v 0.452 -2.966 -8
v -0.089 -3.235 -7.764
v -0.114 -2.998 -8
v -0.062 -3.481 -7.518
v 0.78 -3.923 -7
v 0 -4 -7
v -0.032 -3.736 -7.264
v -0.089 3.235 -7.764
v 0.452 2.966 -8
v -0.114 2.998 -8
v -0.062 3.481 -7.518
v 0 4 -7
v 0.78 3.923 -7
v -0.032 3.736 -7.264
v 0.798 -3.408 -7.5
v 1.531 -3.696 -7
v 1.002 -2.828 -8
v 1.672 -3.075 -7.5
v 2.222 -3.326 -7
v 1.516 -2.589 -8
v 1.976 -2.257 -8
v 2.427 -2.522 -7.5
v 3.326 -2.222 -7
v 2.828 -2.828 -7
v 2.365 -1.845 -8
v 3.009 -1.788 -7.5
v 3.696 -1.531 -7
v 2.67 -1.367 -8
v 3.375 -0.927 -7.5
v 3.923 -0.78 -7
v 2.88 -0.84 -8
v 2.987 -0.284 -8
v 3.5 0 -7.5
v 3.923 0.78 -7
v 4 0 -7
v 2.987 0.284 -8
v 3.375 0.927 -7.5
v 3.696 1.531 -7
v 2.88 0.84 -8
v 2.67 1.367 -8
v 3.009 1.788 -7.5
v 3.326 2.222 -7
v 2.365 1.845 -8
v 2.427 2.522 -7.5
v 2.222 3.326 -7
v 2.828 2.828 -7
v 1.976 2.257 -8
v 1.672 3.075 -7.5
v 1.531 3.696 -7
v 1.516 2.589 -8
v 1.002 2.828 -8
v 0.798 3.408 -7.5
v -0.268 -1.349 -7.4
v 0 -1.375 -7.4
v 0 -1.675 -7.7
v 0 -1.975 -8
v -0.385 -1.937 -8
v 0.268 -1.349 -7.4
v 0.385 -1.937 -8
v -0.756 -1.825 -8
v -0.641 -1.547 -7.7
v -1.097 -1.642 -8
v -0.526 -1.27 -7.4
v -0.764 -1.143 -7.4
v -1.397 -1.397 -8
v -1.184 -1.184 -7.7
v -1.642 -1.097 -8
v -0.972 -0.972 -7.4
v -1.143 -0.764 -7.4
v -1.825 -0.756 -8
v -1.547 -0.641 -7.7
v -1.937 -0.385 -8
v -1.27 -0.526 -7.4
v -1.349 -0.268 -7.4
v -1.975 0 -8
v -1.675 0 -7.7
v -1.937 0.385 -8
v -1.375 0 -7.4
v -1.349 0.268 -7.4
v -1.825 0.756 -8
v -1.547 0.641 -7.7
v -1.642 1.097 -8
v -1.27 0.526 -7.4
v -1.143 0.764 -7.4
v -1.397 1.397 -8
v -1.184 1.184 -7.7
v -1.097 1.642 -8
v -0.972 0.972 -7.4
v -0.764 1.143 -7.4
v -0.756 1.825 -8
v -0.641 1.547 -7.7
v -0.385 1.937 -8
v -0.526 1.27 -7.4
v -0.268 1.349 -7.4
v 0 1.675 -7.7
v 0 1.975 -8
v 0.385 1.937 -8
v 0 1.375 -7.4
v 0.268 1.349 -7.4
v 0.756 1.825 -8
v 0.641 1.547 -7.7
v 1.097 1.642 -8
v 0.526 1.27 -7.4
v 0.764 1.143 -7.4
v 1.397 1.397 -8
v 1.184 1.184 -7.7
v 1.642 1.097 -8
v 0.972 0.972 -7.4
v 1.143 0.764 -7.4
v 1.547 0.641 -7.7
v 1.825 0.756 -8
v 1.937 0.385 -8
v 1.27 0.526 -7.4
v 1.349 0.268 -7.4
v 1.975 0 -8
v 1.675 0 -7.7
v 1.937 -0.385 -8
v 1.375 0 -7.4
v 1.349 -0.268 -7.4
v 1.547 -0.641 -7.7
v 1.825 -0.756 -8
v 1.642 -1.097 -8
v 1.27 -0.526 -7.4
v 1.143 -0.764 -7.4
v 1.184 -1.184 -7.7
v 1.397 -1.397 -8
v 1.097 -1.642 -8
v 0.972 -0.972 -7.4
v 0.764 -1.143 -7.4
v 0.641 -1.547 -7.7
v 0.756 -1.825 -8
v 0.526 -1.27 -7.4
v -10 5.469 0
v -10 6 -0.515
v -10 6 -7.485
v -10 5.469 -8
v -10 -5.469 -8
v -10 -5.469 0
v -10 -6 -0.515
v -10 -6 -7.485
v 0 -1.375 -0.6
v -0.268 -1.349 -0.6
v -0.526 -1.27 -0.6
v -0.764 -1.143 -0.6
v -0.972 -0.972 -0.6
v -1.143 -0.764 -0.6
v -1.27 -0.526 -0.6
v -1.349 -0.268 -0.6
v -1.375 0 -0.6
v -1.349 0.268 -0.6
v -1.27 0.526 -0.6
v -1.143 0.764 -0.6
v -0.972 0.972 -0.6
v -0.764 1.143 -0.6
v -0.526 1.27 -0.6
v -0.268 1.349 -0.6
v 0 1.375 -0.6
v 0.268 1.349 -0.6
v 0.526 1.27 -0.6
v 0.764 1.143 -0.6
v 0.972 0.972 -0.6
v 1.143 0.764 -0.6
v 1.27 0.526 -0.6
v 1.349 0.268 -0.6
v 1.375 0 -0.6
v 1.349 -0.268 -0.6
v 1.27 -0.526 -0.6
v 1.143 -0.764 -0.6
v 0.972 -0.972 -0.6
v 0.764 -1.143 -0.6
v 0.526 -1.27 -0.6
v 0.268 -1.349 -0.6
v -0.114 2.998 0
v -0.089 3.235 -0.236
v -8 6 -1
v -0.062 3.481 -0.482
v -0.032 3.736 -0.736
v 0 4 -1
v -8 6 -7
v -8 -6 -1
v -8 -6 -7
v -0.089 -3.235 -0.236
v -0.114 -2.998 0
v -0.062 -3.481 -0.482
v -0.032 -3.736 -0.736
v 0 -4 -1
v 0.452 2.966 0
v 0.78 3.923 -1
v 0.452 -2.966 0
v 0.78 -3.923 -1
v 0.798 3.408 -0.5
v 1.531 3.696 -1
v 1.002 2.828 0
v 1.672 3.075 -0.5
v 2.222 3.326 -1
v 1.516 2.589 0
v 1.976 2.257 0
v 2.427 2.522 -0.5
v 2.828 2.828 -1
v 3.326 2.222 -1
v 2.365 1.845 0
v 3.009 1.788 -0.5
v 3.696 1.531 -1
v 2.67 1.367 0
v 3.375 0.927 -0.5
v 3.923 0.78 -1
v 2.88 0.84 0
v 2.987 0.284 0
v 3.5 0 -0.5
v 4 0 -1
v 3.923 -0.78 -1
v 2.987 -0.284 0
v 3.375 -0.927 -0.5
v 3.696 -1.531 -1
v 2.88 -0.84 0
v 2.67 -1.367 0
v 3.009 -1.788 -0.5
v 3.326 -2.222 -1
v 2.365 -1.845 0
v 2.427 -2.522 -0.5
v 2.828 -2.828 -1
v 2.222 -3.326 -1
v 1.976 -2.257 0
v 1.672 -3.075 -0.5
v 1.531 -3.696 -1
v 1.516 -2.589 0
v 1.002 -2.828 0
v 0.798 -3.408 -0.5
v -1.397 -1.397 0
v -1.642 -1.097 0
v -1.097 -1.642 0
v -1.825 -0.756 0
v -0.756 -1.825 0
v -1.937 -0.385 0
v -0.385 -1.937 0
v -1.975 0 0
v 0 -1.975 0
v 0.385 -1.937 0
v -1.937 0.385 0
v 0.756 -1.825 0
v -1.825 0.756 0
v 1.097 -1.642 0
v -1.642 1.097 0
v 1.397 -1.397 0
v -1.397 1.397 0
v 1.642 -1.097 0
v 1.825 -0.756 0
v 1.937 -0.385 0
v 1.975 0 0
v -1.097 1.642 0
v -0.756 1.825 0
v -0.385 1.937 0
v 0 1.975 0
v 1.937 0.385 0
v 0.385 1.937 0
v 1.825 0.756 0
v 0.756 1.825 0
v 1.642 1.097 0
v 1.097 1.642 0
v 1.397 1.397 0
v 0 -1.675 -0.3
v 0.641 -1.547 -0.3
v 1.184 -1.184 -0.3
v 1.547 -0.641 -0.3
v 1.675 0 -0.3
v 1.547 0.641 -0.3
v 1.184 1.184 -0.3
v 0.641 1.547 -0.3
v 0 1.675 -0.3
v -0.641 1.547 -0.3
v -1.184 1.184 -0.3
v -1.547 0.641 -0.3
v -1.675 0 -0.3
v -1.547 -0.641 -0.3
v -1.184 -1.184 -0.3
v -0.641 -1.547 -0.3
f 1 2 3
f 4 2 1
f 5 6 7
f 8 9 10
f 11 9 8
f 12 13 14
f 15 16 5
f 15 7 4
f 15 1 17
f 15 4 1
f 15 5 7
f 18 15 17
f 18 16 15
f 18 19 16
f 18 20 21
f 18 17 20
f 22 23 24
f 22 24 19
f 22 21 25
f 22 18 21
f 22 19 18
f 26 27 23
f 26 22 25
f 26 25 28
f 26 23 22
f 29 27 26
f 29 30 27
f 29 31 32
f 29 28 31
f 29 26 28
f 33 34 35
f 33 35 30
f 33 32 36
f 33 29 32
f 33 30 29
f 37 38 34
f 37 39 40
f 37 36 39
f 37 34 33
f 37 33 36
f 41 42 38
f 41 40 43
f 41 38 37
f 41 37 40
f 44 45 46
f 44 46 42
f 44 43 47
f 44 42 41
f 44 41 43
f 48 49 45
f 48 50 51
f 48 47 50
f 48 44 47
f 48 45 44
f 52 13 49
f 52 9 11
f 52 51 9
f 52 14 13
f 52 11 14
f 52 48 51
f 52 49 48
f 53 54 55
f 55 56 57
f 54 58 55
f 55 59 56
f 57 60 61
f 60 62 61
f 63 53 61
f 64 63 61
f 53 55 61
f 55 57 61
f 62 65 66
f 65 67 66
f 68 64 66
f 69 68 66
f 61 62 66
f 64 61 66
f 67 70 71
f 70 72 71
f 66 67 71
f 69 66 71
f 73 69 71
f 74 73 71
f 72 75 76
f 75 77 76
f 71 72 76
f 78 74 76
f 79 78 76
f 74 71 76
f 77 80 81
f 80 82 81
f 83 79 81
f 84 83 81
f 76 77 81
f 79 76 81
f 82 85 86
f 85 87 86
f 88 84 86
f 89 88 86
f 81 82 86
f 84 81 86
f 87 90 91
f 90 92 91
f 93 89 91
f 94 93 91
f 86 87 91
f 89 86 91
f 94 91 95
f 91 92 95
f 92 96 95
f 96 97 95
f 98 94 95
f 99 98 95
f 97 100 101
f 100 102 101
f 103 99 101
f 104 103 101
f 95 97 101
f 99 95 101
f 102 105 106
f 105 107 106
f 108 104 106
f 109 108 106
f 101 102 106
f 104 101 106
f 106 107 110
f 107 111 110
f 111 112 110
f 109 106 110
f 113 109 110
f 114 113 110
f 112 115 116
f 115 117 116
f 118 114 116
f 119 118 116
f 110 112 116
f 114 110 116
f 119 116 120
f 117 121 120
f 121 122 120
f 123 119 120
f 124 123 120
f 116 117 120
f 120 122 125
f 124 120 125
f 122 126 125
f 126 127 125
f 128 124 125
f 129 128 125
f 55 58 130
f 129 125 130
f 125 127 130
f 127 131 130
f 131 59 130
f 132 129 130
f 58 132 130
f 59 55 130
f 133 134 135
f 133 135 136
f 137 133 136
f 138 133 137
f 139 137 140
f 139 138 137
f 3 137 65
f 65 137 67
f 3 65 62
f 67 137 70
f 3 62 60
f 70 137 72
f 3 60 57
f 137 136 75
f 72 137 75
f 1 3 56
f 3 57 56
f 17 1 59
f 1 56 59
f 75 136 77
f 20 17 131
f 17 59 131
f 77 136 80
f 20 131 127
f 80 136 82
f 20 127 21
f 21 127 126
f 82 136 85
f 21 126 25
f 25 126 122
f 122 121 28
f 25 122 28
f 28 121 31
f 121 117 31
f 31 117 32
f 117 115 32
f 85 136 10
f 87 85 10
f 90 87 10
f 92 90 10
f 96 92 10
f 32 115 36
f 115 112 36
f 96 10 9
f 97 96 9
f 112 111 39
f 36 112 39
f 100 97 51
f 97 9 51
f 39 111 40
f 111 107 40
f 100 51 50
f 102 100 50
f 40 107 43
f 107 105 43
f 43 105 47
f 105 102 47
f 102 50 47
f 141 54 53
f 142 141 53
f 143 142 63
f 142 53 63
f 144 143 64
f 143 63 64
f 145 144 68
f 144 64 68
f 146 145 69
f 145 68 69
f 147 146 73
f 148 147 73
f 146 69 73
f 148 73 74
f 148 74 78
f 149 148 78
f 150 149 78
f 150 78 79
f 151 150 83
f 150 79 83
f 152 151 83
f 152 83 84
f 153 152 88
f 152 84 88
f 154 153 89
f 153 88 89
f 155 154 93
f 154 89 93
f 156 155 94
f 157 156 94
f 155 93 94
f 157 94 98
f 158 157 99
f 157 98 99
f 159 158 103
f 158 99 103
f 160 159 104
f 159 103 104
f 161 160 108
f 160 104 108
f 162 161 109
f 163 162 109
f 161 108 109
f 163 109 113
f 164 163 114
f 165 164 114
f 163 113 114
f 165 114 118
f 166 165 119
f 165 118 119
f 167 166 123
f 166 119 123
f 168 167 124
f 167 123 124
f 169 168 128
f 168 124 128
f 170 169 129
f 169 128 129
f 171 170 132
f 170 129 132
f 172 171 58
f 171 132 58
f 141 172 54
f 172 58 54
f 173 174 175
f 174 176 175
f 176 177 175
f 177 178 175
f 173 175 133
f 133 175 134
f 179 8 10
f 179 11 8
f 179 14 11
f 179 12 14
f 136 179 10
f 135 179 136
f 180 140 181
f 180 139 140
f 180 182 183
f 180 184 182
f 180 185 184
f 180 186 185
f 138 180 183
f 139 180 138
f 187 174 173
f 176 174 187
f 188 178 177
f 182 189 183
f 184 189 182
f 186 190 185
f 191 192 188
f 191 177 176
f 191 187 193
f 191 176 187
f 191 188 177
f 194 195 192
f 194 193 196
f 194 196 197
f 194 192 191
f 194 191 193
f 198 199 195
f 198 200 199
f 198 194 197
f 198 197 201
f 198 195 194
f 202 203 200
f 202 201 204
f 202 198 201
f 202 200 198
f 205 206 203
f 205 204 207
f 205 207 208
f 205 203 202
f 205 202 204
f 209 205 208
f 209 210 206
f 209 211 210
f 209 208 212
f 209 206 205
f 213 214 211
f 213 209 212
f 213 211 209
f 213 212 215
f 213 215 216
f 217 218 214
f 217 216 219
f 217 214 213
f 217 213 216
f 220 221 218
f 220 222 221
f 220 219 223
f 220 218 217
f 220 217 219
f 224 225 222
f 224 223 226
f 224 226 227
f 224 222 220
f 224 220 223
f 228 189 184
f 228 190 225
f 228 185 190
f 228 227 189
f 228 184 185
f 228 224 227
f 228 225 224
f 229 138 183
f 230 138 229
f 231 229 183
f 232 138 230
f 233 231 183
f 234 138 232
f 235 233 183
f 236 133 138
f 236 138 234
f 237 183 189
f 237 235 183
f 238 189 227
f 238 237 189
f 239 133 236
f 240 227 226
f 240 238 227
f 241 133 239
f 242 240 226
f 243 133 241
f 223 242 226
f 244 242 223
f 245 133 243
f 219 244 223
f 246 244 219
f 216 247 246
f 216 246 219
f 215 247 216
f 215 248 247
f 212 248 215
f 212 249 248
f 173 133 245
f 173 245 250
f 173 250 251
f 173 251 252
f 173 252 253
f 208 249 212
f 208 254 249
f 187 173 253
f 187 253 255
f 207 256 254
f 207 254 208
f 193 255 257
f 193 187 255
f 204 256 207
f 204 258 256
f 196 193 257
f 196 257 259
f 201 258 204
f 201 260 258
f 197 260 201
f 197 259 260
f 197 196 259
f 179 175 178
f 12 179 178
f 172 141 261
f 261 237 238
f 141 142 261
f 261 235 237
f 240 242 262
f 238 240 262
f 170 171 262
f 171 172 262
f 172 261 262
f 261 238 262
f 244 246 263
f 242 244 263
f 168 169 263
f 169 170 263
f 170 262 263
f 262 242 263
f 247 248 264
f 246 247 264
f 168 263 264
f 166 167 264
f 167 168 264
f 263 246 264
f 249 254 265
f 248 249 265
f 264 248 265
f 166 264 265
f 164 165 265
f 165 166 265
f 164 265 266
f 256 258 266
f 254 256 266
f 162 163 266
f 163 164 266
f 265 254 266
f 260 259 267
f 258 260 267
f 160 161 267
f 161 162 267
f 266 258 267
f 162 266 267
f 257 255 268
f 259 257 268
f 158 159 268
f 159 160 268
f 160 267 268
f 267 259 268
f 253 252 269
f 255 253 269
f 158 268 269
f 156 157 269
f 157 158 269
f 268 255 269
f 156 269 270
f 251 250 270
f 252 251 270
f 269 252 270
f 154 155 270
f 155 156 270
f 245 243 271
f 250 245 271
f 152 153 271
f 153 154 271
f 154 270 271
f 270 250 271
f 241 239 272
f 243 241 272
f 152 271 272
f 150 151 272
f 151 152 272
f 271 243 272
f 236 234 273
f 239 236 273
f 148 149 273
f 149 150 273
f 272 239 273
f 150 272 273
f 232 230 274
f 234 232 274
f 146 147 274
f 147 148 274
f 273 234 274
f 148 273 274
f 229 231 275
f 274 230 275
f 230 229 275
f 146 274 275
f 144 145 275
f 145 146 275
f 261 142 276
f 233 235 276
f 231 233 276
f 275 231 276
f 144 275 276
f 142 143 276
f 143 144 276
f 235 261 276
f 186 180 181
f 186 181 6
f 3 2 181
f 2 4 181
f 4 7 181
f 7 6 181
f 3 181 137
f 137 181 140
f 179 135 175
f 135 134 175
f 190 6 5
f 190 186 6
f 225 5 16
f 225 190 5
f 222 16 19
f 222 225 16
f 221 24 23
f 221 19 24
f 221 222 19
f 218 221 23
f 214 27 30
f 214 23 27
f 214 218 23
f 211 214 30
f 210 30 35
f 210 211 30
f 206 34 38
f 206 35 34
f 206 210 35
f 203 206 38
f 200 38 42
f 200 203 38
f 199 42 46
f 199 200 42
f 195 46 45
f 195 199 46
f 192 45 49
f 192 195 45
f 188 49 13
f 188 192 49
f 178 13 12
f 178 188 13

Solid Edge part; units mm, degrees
sketch "Sketch1" plane through (0, 0, 0) normal (0, 0, 1) x (1, 0, 0)
  line L0 (-10, 6) -> (-10, -6)
  line L1 (-10, -6) -> (-8, -6)
  line L2 (-8, -6) -> (0, -4)
  arc A0 (0, 4) -> (0, -4) centre (0, 0) cw
  line L3 (-8, 6) -> (0, 4)
  line L4 (-10, 6) -> (-8, 6)
  dimension "D1" = 4
  dimension "D2" = 12
  dimension "D3" = 2
  dimension "D4" = 8
extrude "Protrusion1" add sketch "Sketch1" against normal blind 8
hole "screw_hole" at (0, 0, 0) direction (0, 0, -1) diameter 2.75 depth 30 tip angle 118 start chamfer 0.6 start chamfer angle 45 end chamfer 0.6 end chamfer angle 45
chamfer "side_chamfers" distance 1 angle 45 6 edges at (-4, -5, 0) (4, 0, 0) (-4, 5, 0) (-4, -5, -8) (4, 0, -8) (-4, 5, -8)
properties material "Polyethylene, low density"
